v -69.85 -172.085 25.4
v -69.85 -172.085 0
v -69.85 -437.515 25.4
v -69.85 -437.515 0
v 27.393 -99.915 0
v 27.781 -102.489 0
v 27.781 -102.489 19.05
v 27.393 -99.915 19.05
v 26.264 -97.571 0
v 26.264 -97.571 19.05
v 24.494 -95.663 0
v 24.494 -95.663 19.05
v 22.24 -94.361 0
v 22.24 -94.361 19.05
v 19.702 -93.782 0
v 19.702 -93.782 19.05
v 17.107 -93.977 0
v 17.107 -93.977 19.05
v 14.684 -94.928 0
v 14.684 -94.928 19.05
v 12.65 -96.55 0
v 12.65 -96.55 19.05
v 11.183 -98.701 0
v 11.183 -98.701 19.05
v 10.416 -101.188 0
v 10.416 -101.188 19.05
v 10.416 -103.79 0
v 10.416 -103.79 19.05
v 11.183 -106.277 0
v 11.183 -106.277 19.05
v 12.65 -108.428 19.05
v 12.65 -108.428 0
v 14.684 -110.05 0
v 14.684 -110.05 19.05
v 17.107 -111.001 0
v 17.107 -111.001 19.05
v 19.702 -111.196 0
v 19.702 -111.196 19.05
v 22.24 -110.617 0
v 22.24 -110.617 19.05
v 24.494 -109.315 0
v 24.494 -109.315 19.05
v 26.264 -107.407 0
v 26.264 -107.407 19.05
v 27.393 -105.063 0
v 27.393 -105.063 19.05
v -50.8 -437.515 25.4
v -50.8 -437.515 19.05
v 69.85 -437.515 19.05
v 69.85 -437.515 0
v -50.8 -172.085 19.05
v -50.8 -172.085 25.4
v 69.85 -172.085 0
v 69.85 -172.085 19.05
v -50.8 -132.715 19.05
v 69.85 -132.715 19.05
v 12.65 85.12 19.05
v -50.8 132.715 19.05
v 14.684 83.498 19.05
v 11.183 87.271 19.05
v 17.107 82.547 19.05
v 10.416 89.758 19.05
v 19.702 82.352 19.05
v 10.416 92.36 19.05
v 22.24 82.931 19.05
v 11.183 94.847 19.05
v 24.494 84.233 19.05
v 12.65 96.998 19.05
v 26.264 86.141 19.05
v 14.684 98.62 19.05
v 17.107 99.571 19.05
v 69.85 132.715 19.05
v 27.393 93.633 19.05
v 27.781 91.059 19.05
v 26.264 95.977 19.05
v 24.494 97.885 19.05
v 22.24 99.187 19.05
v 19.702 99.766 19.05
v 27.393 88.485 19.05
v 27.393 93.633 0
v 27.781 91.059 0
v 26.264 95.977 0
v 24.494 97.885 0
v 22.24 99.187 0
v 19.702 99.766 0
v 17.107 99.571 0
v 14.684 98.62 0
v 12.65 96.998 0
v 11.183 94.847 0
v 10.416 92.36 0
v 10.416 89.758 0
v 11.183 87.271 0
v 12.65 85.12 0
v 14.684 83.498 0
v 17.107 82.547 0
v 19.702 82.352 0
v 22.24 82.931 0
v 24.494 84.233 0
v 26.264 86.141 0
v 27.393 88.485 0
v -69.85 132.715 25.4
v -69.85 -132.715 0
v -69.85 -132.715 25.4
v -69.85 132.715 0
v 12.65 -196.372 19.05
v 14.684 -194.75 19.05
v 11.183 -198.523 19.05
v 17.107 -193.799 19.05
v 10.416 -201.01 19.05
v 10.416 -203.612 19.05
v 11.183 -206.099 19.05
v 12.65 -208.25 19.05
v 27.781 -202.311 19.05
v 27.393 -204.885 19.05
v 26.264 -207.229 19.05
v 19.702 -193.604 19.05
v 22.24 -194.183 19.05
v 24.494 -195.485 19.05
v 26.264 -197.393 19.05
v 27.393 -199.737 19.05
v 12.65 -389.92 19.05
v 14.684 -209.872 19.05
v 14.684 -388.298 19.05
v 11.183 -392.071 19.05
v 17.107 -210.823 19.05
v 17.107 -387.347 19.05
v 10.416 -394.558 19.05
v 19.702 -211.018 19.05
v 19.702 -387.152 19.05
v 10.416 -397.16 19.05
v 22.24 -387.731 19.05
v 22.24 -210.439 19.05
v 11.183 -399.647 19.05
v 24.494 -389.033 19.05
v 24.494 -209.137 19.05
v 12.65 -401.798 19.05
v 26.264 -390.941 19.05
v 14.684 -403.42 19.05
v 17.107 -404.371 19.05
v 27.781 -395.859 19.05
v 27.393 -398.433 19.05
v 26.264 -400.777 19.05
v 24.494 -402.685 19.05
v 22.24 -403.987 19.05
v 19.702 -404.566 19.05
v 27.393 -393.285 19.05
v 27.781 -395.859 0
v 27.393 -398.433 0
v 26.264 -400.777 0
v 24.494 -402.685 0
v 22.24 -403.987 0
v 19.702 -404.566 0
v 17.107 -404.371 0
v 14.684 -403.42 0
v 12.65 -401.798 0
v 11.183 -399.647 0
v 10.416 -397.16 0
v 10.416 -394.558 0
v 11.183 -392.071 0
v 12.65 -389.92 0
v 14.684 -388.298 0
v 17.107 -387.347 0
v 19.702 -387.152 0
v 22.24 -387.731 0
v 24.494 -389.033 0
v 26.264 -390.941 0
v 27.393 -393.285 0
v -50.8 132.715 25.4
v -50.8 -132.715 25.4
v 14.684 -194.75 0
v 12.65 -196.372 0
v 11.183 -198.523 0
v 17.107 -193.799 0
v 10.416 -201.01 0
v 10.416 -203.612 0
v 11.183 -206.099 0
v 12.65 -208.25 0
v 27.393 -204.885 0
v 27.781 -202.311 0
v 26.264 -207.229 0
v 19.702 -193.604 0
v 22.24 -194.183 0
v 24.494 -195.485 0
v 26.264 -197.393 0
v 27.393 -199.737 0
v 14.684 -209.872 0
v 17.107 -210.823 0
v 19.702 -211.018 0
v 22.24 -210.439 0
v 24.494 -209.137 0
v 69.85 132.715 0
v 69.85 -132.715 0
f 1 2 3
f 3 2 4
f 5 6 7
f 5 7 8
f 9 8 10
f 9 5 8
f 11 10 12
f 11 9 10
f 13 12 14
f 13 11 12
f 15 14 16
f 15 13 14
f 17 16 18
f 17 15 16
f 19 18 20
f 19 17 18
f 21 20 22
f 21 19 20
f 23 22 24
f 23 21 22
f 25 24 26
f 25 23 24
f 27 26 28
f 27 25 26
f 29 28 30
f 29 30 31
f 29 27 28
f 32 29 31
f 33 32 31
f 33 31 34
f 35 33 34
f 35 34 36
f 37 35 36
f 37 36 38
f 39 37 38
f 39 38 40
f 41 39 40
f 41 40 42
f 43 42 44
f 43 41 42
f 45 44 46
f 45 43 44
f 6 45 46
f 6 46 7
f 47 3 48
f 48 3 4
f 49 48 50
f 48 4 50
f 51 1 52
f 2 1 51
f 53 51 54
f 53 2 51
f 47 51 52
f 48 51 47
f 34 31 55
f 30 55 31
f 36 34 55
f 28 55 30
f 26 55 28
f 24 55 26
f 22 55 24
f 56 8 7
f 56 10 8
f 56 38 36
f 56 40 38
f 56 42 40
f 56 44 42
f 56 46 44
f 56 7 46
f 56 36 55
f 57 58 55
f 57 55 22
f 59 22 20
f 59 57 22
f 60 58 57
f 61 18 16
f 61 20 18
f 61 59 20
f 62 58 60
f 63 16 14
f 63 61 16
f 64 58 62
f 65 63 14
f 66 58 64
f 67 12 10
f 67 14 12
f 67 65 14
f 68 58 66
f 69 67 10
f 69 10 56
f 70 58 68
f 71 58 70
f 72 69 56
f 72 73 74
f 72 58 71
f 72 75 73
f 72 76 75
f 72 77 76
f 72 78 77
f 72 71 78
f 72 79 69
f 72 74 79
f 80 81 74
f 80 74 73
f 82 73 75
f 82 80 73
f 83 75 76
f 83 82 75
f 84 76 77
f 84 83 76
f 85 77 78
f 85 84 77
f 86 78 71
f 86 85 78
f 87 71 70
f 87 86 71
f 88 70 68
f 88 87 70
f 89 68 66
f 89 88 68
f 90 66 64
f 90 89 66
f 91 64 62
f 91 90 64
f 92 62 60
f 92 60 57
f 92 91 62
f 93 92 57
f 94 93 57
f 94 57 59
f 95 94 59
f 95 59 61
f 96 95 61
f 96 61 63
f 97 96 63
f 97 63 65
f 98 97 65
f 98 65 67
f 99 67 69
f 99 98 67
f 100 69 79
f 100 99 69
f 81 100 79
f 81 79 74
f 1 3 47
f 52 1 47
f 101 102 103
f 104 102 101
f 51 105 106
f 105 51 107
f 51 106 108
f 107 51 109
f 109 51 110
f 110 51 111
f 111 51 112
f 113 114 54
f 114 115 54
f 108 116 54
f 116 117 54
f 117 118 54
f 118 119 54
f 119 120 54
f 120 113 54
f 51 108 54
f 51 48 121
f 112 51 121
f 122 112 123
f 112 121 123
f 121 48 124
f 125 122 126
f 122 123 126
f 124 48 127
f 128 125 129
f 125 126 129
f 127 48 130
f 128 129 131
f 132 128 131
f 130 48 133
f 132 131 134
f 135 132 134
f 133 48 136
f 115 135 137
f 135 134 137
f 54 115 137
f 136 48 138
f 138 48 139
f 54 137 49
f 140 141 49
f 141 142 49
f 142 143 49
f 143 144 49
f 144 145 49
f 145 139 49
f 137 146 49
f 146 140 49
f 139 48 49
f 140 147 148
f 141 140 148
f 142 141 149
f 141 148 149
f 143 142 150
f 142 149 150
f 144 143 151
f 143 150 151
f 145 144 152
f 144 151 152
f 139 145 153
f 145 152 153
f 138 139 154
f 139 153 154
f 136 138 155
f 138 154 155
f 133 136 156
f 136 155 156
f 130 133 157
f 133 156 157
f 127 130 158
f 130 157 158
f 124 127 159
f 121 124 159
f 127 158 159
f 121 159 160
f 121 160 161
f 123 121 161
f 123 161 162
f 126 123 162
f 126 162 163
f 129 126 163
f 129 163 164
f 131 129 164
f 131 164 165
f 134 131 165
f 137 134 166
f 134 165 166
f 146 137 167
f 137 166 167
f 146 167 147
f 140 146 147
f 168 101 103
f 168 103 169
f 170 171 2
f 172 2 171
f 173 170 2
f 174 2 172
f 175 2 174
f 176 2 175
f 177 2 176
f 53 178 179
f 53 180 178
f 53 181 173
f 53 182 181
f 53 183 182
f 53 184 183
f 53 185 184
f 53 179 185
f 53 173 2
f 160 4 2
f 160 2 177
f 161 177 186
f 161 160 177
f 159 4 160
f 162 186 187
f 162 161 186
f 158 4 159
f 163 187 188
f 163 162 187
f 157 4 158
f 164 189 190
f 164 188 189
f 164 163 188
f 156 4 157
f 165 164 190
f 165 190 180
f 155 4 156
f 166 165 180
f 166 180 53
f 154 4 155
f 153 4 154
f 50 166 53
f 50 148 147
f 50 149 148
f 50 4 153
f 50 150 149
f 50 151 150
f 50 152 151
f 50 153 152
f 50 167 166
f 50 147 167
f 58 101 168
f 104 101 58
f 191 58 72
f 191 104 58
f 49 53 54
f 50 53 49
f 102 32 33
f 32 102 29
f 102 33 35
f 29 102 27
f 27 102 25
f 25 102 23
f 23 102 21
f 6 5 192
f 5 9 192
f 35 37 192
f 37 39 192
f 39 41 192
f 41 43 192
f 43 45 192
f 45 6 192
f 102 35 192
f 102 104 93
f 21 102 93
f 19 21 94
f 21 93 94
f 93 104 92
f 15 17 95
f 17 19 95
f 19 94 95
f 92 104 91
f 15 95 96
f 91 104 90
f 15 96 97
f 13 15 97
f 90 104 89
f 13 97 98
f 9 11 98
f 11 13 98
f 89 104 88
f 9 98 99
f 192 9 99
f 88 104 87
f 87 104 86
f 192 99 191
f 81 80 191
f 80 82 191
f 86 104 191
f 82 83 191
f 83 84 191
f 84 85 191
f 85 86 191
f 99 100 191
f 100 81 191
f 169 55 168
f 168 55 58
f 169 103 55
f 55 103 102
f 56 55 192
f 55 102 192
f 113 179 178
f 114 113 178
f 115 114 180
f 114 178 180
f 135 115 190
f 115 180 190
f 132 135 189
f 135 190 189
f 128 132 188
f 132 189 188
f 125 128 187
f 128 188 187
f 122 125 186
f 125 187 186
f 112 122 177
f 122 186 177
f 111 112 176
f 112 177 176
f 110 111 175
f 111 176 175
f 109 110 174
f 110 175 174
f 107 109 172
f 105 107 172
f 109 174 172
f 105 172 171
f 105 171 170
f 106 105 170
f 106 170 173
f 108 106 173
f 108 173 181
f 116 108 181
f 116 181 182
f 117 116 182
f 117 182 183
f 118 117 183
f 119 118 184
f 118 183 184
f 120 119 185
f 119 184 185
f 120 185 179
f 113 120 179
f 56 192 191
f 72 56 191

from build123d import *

# Parameters (mm, degrees)
F0_W     = 139.7
F0_H     = 265.43
F0_R     = 8.73125
F1_DEPTH = 19.05
F2_W     = 19.05
F2_H     = 265.43
F3_DEPTH = 6.35


with BuildPart() as f1:
    # F0 (on Top) → F1 (new body)
    with BuildSketch(Plane.XY):
        Rectangle(F0_W, F0_H)
        with Locations((19.05, -102.489)):
            Circle(F0_R, mode=Mode.SUBTRACT)
        with Locations((19.05, 91.059)):
            Circle(F0_R, mode=Mode.SUBTRACT)
    extrude(amount=F1_DEPTH)

    # F2 (on face) → F3 (join)
    with BuildSketch(Plane.XY.offset(19.05)):
        with Locations((-60.325, 0)):
            Rectangle(F2_W, F2_H)
    extrude(amount=F3_DEPTH)


with BuildPart() as f5_1:
    # F5: instance of F1
    add(f1.part.mirror(Plane.XZ.offset(152.4)))


solid = Compound([f1.part, f5_1.part])
